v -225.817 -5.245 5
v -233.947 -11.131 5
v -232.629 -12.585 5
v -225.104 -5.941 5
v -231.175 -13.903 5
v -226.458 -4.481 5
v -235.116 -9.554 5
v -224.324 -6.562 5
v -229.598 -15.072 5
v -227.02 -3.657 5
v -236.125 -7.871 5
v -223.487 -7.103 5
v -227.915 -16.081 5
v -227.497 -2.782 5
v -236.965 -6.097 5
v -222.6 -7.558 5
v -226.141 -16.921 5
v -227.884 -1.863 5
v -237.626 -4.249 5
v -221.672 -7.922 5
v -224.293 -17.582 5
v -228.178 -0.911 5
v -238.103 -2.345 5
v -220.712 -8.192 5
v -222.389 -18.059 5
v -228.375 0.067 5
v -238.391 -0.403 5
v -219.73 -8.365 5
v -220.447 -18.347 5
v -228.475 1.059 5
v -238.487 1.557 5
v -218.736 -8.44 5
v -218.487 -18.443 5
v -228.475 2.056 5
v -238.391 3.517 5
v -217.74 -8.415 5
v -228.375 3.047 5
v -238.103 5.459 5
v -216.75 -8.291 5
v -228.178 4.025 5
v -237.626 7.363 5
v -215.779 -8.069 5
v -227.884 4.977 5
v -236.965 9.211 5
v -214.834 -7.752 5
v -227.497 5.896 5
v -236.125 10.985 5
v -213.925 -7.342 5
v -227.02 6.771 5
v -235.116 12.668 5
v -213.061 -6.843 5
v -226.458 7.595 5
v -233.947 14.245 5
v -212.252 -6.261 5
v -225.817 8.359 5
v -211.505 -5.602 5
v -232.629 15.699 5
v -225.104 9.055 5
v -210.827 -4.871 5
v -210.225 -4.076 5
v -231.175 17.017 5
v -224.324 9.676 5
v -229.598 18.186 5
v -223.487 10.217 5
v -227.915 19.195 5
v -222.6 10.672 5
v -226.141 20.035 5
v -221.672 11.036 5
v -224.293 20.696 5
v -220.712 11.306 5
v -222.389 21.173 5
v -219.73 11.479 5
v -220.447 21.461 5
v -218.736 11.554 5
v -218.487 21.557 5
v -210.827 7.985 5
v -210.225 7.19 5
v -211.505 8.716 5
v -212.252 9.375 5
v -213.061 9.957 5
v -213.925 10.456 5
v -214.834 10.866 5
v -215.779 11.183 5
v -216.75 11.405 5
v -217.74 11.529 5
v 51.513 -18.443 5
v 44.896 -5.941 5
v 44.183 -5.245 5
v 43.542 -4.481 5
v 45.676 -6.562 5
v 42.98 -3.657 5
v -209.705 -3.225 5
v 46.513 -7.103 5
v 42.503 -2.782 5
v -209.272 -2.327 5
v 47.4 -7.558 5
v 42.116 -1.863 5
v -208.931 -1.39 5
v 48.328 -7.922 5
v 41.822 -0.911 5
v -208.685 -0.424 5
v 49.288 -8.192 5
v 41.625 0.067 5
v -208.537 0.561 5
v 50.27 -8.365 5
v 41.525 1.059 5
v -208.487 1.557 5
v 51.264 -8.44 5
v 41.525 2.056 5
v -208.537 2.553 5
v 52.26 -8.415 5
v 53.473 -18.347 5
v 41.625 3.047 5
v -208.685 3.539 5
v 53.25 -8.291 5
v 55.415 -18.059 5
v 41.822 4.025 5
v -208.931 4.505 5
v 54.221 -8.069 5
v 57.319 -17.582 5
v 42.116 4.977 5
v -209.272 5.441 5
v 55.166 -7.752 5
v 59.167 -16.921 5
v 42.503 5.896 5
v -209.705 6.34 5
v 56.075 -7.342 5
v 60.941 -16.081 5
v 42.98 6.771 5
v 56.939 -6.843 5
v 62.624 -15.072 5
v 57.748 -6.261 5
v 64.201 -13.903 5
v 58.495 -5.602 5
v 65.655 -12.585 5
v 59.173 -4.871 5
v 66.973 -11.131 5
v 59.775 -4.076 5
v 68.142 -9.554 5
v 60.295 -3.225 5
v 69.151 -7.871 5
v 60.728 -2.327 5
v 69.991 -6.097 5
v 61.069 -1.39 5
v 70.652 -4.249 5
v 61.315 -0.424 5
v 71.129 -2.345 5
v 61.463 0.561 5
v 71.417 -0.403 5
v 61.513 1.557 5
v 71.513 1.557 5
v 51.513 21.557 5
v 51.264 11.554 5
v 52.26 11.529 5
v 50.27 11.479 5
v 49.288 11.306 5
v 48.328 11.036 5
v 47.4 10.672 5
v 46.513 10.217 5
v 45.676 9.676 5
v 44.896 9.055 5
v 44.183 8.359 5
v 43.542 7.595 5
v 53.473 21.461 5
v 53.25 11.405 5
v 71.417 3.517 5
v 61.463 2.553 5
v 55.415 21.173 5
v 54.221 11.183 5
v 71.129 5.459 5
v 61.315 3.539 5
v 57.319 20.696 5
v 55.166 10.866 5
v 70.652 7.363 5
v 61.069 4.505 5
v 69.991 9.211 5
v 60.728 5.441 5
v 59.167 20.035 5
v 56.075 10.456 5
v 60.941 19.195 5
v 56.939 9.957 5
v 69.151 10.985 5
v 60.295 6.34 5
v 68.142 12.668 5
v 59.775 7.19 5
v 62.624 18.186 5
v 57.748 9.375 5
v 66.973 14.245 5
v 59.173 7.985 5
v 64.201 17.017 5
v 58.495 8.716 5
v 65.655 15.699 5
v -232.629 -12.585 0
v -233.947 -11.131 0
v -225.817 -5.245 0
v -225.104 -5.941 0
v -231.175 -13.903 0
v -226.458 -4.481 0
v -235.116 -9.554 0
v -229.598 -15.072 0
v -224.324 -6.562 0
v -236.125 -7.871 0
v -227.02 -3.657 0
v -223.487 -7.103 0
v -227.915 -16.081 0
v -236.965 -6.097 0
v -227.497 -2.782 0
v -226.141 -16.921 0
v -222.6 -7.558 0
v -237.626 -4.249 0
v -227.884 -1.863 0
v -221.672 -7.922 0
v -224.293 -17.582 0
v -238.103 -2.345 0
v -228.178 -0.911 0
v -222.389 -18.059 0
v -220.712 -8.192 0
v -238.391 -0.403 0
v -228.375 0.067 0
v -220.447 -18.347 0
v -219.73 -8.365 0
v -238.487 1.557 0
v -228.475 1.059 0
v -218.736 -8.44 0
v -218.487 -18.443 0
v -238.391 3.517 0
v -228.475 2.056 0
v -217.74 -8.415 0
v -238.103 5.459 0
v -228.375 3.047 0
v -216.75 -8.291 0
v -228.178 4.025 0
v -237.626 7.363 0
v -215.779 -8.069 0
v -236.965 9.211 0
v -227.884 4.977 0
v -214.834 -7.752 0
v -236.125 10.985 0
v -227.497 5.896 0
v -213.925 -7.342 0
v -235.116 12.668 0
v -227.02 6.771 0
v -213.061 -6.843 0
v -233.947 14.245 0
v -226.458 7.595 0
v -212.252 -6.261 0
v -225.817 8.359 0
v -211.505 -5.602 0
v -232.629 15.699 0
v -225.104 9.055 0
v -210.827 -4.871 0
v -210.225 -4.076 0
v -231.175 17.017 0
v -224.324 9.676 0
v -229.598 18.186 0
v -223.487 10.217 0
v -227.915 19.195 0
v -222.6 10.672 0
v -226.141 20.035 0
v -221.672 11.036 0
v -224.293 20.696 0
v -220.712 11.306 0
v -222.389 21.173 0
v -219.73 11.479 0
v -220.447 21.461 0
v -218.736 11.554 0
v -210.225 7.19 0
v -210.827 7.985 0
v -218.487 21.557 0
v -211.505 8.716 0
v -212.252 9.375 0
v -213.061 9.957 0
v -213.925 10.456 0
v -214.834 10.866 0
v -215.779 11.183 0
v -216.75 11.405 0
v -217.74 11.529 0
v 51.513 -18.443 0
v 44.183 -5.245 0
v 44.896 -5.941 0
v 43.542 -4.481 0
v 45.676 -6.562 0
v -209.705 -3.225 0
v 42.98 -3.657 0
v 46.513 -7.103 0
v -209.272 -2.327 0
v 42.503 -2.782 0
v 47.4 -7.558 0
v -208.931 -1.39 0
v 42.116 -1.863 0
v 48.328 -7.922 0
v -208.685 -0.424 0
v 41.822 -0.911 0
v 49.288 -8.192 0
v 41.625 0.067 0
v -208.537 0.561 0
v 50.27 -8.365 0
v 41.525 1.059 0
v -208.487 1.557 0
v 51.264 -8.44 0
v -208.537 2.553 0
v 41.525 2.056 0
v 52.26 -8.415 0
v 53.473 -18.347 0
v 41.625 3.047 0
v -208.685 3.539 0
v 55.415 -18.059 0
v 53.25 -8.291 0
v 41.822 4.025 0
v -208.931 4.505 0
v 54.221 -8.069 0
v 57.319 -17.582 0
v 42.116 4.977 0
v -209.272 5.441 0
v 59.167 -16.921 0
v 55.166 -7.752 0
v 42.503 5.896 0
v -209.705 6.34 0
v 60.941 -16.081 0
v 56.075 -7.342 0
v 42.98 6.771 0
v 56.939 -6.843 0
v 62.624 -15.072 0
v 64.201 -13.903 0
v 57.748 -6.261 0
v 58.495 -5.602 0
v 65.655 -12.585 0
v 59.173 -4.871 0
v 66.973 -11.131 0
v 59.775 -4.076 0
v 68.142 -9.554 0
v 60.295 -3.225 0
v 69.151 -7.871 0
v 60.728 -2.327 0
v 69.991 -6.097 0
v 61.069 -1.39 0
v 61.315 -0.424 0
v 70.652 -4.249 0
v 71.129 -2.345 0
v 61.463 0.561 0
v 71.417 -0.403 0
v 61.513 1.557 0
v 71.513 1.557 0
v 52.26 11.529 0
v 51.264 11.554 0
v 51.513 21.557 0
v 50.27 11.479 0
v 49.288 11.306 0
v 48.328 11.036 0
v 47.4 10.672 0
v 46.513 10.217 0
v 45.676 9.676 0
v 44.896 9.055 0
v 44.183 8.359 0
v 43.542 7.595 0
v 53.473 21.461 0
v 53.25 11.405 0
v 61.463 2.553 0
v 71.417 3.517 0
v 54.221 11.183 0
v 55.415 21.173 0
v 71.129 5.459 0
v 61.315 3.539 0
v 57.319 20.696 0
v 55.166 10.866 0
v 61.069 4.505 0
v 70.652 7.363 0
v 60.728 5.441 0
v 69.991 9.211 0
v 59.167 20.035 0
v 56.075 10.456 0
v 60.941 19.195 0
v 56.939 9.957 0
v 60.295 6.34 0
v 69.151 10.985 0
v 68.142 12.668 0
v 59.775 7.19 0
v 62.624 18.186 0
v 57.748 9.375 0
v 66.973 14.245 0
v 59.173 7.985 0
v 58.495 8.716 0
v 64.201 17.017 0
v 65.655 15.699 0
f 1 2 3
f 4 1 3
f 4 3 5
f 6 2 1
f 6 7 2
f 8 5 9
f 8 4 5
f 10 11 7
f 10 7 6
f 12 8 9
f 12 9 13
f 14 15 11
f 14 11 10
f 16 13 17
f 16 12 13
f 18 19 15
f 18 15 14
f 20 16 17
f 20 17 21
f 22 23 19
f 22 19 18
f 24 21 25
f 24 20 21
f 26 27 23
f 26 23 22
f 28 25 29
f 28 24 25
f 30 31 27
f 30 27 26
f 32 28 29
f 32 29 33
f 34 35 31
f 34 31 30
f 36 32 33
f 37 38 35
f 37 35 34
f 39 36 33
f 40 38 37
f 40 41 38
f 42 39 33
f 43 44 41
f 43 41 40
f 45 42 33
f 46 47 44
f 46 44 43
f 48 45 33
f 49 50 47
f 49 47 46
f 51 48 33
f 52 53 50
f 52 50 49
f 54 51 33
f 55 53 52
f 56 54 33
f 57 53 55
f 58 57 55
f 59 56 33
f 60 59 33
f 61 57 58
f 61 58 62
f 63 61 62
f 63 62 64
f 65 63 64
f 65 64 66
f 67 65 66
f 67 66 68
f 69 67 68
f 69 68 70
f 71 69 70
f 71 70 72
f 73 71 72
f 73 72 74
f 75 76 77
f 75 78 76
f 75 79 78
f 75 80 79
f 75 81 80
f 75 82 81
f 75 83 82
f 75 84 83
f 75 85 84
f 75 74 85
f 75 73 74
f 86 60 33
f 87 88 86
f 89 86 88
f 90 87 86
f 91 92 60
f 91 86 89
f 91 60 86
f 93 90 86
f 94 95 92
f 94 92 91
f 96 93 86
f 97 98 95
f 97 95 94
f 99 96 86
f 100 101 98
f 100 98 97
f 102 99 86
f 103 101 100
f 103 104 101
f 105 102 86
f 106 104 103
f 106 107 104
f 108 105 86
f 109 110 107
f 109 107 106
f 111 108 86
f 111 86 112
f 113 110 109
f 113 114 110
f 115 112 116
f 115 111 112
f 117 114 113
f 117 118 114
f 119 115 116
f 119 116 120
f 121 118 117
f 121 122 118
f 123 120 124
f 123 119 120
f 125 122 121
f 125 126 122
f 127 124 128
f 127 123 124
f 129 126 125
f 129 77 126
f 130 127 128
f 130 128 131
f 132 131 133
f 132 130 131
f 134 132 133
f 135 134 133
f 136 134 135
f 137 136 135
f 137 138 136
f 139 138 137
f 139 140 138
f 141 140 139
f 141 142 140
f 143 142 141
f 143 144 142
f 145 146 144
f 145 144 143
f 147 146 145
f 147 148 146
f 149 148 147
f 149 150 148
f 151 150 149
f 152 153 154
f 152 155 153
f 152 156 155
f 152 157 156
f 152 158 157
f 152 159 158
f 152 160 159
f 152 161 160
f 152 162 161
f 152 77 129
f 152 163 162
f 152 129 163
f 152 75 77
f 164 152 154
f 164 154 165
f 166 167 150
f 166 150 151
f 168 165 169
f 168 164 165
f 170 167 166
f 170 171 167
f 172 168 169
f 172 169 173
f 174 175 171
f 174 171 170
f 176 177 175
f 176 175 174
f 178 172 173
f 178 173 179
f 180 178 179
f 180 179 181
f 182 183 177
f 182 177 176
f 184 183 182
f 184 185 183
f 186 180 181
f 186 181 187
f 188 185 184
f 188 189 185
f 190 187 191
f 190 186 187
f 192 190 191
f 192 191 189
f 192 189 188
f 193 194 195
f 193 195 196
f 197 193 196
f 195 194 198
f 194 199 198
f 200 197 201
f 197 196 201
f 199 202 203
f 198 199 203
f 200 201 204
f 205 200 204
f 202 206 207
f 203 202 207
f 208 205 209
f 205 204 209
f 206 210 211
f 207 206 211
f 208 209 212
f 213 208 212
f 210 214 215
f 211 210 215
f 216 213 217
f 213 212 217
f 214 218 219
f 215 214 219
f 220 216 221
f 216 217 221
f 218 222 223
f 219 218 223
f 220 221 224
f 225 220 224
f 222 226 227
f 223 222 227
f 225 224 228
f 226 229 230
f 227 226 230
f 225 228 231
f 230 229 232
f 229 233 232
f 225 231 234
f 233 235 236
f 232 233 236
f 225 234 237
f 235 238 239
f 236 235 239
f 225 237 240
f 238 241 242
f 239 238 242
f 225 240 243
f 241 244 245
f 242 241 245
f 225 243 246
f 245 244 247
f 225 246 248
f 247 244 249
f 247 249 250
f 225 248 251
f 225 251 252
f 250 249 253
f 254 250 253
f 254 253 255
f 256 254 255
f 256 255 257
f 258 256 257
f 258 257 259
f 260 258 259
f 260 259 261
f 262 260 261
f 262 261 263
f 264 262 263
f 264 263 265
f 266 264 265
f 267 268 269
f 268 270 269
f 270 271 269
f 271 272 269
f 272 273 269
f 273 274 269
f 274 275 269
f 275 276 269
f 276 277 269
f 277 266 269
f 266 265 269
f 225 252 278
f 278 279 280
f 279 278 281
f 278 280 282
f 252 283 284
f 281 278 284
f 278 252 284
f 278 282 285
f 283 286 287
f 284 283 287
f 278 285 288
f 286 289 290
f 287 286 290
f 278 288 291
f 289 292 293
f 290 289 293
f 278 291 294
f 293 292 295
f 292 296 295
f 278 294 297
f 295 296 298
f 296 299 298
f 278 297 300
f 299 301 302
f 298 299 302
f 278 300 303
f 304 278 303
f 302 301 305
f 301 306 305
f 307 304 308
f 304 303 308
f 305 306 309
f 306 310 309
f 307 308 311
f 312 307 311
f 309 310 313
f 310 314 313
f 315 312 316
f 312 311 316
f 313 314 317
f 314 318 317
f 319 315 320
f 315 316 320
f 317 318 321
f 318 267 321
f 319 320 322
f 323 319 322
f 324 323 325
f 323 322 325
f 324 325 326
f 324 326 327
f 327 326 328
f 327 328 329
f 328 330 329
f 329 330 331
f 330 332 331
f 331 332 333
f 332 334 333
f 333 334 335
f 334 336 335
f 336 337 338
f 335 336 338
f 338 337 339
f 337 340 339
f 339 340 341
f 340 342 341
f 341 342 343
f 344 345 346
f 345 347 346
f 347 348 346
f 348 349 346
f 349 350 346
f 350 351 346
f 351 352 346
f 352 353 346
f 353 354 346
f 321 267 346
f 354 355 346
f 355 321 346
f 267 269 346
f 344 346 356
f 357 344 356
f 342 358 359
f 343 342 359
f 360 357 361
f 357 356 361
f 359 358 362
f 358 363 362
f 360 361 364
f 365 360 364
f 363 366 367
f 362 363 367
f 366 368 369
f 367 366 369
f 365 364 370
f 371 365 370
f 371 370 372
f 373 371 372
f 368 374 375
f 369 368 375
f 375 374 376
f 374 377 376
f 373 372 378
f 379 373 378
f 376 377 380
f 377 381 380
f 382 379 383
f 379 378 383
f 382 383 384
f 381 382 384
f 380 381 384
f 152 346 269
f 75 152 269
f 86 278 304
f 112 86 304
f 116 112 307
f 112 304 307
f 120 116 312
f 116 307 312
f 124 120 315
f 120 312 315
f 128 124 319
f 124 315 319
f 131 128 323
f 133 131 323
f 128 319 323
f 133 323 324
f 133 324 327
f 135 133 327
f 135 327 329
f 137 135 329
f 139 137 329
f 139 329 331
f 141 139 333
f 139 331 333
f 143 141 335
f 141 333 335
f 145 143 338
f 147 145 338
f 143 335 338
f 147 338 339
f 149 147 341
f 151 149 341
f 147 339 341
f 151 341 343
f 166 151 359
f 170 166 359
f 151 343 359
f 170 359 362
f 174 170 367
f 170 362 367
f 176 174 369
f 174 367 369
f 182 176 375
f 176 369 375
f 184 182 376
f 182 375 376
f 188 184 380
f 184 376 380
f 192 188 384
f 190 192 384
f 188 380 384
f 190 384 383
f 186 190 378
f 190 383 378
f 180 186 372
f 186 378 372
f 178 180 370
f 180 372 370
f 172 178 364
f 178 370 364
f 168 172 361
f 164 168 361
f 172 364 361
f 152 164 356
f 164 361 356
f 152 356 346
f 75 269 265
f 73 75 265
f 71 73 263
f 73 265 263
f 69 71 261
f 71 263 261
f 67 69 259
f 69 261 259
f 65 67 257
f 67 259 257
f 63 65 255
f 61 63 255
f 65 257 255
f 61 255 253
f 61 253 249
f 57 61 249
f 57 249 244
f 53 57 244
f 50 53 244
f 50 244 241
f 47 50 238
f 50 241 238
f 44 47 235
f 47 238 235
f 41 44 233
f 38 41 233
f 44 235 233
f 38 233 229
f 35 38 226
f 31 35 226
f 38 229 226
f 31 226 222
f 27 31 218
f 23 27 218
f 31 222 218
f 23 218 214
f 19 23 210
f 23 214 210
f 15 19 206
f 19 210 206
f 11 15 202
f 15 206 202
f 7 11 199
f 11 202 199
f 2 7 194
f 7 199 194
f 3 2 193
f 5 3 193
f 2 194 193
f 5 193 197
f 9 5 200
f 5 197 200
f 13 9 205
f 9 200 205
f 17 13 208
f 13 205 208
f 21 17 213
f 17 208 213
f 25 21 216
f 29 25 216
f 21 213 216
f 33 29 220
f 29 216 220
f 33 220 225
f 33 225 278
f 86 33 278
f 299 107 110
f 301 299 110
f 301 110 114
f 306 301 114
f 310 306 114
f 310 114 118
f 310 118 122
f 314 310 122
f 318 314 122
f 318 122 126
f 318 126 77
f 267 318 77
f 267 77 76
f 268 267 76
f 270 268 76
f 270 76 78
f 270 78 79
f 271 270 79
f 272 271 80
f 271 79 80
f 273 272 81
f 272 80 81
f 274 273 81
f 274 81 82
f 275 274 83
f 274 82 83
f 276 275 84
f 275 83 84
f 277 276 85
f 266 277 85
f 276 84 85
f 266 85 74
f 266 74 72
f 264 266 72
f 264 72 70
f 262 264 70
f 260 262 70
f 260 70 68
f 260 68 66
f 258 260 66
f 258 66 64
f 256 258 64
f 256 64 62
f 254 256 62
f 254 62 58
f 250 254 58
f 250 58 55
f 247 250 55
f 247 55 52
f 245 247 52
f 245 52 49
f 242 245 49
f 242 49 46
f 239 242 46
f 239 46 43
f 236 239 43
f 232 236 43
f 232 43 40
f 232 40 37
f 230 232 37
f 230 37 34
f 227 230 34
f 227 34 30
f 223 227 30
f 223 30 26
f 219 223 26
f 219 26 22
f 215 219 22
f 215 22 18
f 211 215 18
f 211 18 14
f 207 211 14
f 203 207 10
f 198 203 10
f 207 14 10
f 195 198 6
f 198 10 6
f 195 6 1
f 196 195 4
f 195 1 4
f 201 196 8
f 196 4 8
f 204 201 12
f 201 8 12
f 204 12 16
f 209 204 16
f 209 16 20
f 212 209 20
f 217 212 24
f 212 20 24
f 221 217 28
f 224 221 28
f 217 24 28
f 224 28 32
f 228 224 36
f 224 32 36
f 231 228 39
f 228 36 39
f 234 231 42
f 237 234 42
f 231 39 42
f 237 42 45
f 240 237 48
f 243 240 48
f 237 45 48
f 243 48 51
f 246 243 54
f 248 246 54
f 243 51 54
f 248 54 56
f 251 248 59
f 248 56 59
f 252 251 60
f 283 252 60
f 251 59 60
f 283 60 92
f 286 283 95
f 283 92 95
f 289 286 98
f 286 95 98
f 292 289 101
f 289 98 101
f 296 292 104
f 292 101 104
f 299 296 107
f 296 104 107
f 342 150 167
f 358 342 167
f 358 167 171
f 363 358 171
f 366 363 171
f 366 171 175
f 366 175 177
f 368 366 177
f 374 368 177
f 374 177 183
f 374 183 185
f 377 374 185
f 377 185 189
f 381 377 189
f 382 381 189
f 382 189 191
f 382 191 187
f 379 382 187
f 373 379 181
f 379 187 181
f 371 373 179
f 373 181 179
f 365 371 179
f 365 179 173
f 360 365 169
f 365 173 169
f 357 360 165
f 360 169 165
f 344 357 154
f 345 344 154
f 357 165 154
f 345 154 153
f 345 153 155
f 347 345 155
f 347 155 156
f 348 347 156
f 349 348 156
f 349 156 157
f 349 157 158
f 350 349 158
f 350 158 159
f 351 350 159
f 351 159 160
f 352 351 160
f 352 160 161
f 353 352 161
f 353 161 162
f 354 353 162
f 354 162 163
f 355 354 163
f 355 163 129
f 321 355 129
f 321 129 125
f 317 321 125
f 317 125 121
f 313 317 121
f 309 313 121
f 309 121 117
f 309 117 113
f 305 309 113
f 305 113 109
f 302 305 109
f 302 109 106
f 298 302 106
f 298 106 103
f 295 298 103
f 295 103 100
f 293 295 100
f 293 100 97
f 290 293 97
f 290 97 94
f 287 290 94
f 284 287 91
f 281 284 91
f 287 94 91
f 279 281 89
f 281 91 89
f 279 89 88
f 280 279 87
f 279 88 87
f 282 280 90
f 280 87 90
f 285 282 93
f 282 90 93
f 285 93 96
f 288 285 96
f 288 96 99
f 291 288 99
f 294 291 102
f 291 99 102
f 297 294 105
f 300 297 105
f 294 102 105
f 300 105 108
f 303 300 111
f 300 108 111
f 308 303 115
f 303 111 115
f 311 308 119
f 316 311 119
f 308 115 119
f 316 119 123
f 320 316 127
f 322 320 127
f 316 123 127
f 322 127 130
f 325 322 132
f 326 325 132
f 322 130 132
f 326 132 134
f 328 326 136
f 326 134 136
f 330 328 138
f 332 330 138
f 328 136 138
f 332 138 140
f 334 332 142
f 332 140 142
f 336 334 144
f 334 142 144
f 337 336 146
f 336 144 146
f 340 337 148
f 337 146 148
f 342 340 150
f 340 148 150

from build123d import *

# Parameters (mm, degrees)
EXTRUDE1_DEPTH     = 5
SKETCH2_R          = 10
CUT_EXTRUDE1_DEPTH = 6


with BuildPart() as part:
    # Sketch1 → Extrude1 (new body)
    with BuildSketch(Plane.XY):
        with BuildLine():
            Line((51.513050076, 21.557056146), (-218.486949924, 21.557056146))
            ThreePointArc((-218.486949924, 21.557056146), (-238.486949924, 1.557056146), (-218.486949924, -18.442943854))
            Line((-218.486949924, -18.442943854), (51.513050076, -18.442943854))
            ThreePointArc((51.513050076, -18.442943854), (71.513050076, 1.557056146), (51.513050076, 21.557056146))
        make_face()
    extrude(amount=EXTRUDE1_DEPTH)

    # Sketch2 → Cut-Extrude1 (cut, through all)
    with BuildSketch(Plane.XY.offset(5)):
        with Locations((-218.486949924, 1.557056146)):
            Circle(SKETCH2_R)
        with Locations((51.513050076, 1.557056146)):
            Circle(SKETCH2_R)
    extrude(amount=-CUT_EXTRUDE1_DEPTH, mode=Mode.SUBTRACT)


solid = part.part
